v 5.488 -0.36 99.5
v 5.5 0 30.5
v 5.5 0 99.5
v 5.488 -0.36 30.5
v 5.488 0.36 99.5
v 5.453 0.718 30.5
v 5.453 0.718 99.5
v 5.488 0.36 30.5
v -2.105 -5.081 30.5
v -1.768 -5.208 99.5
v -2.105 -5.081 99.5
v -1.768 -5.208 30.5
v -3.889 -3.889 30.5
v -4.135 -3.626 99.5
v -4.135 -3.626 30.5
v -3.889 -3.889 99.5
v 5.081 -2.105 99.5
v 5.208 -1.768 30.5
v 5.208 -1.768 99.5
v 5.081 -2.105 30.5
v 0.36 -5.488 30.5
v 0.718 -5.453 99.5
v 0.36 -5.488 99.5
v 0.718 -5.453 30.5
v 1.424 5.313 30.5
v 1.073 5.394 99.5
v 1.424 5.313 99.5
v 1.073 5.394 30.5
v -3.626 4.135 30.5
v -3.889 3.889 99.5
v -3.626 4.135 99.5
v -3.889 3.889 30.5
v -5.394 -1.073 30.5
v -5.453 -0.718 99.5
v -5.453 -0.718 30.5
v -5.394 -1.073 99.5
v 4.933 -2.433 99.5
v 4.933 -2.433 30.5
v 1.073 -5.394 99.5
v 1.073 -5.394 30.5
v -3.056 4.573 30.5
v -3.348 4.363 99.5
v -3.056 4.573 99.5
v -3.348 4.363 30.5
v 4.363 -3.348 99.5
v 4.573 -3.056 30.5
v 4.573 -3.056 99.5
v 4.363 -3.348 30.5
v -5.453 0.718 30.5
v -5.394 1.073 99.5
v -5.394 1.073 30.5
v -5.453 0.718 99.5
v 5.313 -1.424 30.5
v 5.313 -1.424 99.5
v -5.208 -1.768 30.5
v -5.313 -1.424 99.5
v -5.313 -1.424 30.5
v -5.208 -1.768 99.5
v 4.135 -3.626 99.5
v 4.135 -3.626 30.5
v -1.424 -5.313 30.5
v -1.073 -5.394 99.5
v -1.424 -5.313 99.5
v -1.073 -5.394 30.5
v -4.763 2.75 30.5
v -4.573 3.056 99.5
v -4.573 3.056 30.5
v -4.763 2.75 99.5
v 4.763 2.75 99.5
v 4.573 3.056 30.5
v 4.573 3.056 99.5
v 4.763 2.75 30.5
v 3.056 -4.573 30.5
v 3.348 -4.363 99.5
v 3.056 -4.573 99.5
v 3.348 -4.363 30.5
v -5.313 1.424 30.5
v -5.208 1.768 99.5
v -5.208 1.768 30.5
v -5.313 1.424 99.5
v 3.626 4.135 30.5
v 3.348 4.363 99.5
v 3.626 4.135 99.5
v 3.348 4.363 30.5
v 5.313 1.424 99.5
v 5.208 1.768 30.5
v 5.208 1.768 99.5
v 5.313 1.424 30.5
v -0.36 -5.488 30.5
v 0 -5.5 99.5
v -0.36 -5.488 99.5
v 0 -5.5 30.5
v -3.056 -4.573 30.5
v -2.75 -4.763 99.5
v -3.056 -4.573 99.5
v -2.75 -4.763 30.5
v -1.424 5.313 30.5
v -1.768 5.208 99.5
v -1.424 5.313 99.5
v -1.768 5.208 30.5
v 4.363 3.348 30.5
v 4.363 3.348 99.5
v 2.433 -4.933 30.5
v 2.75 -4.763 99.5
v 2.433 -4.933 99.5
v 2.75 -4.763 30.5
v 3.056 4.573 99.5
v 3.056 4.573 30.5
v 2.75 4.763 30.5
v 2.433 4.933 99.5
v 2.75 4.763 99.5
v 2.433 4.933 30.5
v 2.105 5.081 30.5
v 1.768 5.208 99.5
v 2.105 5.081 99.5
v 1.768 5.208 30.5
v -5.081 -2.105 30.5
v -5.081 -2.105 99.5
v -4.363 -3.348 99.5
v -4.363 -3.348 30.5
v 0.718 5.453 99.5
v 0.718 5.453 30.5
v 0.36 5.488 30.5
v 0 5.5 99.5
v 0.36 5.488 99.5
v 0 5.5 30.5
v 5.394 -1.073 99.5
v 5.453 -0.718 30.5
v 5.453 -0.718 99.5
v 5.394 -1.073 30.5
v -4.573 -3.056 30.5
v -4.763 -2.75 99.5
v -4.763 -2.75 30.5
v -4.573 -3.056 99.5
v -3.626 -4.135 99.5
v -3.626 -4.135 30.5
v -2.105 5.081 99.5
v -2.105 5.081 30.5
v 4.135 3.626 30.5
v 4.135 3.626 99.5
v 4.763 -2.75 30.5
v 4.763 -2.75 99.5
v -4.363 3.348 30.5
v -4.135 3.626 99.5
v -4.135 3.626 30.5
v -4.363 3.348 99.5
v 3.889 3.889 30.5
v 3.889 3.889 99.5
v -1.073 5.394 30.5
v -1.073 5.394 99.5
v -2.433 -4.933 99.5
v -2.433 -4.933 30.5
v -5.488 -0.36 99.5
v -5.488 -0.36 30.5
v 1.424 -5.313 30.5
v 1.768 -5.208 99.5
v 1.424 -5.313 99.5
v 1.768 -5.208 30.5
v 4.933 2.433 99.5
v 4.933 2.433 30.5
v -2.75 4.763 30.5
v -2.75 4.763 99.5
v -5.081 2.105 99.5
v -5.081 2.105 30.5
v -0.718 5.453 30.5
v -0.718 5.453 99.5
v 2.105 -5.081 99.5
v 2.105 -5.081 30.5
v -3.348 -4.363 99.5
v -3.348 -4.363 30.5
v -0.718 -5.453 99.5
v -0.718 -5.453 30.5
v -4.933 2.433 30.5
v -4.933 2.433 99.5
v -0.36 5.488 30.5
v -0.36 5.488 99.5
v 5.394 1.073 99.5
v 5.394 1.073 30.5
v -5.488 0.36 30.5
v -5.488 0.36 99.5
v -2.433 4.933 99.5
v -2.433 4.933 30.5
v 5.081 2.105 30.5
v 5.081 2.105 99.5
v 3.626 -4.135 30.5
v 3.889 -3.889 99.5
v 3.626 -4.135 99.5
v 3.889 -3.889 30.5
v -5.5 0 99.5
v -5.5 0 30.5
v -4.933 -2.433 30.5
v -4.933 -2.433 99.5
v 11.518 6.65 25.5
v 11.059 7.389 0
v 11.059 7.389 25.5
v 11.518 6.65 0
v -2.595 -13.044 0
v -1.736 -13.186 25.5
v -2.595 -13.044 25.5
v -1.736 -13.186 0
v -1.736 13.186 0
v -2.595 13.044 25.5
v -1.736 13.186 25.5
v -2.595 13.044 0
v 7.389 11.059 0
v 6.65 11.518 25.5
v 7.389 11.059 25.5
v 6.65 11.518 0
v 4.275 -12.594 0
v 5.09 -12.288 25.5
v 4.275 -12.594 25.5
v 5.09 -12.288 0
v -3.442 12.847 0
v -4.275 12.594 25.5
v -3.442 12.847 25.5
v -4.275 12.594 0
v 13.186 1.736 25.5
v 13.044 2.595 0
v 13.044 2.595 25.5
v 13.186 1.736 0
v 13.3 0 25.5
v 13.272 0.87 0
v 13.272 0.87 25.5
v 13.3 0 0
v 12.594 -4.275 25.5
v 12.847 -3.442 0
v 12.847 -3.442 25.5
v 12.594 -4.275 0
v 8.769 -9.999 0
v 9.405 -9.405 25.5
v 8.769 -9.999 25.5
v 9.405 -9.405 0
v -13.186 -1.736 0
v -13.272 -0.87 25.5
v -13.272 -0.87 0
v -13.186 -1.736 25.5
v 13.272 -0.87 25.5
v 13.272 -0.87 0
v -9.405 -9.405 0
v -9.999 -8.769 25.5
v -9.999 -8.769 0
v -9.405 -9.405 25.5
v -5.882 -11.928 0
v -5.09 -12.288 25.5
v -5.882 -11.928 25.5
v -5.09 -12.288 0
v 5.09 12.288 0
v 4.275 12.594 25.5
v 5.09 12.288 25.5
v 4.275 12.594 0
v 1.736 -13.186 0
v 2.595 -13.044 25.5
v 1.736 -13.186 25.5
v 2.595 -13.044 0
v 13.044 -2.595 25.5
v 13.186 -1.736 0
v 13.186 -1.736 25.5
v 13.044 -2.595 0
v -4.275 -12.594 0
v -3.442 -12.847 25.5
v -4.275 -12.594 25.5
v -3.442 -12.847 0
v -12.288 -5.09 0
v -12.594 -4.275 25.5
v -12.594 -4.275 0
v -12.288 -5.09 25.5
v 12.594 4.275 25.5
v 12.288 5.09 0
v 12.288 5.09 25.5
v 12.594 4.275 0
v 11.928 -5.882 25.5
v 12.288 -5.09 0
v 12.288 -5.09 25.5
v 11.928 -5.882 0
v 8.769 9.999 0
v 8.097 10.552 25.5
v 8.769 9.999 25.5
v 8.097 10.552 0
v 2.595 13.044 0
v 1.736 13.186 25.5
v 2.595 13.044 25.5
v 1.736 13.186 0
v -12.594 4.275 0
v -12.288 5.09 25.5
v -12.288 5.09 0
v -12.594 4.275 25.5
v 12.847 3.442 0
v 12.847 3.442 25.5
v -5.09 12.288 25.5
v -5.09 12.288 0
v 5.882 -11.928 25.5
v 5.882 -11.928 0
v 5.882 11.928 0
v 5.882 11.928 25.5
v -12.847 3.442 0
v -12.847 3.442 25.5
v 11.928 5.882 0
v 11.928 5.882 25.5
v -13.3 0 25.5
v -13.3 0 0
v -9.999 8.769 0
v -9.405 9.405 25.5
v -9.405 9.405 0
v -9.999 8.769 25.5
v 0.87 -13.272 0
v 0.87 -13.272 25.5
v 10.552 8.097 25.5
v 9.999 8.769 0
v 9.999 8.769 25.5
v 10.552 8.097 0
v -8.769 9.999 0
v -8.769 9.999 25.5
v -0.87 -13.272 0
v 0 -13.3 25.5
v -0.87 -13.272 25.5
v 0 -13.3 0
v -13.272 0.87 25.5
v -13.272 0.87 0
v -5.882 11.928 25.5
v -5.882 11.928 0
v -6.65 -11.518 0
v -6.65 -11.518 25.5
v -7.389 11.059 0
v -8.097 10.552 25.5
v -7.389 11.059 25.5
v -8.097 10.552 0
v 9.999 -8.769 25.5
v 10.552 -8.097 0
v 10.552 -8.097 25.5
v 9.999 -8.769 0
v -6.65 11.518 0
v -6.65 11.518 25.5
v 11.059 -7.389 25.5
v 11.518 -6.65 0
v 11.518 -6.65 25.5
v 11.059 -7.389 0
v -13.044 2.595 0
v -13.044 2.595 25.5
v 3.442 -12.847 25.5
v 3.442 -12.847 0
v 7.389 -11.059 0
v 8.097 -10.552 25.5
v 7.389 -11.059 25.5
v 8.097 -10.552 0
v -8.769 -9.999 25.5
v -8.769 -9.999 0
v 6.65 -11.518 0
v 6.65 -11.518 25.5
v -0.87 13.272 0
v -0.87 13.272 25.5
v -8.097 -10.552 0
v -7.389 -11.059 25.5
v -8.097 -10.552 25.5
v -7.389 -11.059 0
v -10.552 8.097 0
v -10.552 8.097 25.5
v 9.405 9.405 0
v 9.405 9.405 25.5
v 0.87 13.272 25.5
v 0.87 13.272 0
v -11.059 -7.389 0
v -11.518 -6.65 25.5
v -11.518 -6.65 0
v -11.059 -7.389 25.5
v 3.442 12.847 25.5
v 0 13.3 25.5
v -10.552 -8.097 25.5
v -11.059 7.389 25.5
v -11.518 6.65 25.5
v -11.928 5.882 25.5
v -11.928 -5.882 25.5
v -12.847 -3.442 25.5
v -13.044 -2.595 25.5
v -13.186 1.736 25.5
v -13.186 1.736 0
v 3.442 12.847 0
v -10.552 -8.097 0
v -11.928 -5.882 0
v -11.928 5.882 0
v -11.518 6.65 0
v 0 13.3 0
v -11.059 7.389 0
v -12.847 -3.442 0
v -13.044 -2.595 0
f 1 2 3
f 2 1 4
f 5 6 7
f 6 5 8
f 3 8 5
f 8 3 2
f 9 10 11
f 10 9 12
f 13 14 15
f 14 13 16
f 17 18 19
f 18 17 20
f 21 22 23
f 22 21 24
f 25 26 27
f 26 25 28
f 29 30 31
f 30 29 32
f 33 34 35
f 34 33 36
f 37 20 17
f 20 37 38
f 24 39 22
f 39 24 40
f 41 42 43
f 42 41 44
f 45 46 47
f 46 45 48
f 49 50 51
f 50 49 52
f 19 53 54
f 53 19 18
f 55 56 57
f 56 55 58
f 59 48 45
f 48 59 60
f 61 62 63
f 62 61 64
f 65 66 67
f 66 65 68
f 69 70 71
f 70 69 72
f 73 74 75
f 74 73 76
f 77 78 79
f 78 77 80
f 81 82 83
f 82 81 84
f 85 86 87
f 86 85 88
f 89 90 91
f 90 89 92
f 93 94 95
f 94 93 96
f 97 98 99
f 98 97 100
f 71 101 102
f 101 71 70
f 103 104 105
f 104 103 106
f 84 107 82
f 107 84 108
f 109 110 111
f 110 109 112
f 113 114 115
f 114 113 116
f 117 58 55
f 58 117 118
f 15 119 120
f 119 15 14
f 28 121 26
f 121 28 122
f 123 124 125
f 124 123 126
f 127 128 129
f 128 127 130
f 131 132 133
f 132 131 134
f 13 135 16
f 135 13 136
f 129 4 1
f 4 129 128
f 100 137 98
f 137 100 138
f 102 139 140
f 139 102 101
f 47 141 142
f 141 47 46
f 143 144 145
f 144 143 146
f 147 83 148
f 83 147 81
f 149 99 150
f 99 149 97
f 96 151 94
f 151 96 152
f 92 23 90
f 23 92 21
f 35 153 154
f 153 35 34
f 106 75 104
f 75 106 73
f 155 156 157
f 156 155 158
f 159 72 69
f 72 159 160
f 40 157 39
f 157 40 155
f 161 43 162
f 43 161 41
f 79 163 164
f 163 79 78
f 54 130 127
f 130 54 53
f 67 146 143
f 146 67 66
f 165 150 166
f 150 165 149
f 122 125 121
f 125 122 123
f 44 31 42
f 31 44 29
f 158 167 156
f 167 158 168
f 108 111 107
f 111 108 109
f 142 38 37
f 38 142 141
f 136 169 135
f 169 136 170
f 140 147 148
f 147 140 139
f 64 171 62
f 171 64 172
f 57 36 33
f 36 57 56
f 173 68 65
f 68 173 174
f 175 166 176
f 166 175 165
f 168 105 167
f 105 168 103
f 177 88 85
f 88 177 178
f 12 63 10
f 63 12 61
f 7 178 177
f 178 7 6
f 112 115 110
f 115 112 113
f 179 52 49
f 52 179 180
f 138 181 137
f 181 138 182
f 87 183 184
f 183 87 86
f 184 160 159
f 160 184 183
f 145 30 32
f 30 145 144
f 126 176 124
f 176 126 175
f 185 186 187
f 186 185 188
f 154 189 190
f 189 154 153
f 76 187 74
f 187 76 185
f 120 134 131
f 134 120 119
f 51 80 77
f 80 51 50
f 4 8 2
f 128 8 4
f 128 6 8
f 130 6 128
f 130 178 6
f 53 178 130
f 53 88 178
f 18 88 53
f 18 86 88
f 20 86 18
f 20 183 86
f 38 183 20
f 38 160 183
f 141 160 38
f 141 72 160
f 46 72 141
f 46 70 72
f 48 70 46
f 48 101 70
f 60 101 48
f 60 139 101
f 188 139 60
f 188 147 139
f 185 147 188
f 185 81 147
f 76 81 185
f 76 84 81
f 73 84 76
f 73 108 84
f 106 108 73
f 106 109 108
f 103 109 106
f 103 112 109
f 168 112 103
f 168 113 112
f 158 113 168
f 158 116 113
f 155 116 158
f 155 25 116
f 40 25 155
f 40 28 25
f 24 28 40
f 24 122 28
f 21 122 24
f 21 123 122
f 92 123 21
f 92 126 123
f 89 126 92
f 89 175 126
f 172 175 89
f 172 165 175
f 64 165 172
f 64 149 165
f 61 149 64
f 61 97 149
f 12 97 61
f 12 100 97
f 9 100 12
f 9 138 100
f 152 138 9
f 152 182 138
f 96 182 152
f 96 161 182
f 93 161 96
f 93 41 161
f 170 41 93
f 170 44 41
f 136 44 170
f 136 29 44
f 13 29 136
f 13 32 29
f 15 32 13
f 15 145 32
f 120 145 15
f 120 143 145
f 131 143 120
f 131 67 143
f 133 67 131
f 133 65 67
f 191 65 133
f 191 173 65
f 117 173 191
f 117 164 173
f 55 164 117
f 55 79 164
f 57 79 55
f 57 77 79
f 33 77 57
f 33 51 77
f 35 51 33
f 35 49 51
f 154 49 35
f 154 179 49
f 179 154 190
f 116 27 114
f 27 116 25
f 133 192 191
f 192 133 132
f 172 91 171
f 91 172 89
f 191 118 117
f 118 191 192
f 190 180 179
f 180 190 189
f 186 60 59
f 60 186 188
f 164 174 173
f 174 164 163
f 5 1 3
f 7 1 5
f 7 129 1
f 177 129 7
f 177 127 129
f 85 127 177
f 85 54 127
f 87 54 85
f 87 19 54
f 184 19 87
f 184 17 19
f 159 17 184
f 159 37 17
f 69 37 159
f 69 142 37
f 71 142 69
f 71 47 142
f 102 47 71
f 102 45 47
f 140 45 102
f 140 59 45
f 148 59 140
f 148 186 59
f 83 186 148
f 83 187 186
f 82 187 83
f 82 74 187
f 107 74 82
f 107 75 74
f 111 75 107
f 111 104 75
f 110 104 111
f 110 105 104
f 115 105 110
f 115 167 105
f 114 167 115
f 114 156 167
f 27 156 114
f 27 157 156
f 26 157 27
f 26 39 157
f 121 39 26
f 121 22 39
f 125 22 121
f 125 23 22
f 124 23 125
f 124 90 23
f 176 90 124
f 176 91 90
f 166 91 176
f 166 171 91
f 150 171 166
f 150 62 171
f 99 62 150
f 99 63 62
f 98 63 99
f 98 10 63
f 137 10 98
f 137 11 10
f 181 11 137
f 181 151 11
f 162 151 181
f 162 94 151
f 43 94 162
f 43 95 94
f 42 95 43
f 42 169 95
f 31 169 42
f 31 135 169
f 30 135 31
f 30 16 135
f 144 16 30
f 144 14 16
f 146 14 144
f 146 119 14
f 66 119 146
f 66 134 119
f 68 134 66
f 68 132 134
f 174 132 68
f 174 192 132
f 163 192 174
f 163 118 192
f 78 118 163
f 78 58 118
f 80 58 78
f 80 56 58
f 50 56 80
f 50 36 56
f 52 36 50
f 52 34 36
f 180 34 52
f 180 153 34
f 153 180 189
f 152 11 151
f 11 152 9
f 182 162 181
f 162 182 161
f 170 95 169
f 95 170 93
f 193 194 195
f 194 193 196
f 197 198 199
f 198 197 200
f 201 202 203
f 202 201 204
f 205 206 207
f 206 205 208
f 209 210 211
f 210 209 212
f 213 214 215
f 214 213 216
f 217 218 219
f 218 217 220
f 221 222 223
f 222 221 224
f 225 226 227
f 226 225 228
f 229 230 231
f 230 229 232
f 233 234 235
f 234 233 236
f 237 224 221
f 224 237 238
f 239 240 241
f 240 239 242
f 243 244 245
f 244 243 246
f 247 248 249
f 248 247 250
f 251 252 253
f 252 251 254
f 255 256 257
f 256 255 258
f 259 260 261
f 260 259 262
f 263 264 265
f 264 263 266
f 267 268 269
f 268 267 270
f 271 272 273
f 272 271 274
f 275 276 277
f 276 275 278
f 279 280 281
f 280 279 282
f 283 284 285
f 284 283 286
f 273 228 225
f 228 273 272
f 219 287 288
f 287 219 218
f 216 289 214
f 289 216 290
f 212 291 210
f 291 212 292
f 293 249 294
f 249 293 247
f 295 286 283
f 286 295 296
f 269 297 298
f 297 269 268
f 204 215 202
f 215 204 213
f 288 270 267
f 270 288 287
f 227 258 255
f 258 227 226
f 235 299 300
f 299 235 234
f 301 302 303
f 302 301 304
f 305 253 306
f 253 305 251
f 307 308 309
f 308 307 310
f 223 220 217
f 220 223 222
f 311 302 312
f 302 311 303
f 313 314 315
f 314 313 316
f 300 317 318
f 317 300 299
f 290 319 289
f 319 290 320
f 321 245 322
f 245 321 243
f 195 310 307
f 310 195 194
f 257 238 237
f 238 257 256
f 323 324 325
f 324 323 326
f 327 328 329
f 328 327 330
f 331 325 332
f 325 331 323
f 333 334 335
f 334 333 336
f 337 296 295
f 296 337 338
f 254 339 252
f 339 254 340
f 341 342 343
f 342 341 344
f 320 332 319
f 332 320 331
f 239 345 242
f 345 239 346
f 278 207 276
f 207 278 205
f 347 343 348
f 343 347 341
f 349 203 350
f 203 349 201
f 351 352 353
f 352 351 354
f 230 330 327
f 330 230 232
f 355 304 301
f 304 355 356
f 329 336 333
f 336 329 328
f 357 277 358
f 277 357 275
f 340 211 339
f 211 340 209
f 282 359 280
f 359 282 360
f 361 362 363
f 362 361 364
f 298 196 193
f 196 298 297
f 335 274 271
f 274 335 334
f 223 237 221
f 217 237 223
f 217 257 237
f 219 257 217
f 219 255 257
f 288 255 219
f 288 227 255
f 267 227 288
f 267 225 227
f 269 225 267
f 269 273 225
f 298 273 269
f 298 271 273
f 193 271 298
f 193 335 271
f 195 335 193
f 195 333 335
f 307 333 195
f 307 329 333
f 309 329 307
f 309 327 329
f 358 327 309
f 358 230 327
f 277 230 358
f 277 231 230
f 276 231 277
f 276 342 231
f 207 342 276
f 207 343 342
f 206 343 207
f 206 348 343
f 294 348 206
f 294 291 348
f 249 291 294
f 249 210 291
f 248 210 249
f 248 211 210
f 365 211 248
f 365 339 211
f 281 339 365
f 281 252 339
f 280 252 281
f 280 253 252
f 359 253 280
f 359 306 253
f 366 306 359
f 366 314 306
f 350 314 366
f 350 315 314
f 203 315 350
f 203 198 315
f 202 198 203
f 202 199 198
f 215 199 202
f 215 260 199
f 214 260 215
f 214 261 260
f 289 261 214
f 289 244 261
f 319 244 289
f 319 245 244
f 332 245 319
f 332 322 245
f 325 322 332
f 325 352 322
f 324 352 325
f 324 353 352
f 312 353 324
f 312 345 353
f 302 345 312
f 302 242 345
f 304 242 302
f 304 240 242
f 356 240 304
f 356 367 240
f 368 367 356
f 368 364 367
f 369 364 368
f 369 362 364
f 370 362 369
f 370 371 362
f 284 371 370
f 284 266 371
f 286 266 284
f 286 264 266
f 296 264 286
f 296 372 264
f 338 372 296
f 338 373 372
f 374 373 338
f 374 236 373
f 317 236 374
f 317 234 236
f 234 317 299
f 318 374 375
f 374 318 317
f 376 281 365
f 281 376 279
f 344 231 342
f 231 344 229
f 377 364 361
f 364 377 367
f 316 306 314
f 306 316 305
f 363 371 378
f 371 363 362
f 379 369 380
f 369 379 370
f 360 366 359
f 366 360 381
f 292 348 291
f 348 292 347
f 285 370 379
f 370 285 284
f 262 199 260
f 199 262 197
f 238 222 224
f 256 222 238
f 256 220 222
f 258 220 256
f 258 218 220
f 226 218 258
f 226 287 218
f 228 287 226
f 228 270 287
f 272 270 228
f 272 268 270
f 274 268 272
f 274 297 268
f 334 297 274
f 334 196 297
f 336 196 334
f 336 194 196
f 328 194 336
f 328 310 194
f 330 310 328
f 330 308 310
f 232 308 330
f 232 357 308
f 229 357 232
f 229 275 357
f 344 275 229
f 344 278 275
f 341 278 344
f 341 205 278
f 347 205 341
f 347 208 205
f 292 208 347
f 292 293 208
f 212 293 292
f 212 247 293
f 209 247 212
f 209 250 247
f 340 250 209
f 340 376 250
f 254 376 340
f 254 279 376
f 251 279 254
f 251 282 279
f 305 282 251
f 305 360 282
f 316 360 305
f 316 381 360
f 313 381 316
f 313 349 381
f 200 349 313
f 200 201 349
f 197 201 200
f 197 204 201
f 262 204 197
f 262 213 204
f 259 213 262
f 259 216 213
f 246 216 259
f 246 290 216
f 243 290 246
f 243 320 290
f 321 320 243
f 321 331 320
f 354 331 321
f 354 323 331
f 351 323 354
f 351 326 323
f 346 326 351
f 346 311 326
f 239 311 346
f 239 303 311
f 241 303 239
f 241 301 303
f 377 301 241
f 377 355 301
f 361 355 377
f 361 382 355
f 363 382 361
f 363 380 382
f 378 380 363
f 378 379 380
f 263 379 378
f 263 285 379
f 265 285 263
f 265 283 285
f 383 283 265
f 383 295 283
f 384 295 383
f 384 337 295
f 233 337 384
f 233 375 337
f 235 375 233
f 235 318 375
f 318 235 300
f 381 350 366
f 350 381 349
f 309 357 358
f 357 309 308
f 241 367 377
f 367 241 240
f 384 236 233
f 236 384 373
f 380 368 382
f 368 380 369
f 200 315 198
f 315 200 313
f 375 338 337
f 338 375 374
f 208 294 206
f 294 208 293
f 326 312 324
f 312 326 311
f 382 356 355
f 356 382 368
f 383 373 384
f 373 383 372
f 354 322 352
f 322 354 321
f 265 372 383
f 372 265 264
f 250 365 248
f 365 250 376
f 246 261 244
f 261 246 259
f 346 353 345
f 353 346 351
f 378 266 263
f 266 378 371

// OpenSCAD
union() {
  translate([0, 0, 30.5]) {
    cylinder(h = 69, r = 5.5);
  }
  cylinder(h = 25.5, r = 13.3);
}
$fn = 96;
